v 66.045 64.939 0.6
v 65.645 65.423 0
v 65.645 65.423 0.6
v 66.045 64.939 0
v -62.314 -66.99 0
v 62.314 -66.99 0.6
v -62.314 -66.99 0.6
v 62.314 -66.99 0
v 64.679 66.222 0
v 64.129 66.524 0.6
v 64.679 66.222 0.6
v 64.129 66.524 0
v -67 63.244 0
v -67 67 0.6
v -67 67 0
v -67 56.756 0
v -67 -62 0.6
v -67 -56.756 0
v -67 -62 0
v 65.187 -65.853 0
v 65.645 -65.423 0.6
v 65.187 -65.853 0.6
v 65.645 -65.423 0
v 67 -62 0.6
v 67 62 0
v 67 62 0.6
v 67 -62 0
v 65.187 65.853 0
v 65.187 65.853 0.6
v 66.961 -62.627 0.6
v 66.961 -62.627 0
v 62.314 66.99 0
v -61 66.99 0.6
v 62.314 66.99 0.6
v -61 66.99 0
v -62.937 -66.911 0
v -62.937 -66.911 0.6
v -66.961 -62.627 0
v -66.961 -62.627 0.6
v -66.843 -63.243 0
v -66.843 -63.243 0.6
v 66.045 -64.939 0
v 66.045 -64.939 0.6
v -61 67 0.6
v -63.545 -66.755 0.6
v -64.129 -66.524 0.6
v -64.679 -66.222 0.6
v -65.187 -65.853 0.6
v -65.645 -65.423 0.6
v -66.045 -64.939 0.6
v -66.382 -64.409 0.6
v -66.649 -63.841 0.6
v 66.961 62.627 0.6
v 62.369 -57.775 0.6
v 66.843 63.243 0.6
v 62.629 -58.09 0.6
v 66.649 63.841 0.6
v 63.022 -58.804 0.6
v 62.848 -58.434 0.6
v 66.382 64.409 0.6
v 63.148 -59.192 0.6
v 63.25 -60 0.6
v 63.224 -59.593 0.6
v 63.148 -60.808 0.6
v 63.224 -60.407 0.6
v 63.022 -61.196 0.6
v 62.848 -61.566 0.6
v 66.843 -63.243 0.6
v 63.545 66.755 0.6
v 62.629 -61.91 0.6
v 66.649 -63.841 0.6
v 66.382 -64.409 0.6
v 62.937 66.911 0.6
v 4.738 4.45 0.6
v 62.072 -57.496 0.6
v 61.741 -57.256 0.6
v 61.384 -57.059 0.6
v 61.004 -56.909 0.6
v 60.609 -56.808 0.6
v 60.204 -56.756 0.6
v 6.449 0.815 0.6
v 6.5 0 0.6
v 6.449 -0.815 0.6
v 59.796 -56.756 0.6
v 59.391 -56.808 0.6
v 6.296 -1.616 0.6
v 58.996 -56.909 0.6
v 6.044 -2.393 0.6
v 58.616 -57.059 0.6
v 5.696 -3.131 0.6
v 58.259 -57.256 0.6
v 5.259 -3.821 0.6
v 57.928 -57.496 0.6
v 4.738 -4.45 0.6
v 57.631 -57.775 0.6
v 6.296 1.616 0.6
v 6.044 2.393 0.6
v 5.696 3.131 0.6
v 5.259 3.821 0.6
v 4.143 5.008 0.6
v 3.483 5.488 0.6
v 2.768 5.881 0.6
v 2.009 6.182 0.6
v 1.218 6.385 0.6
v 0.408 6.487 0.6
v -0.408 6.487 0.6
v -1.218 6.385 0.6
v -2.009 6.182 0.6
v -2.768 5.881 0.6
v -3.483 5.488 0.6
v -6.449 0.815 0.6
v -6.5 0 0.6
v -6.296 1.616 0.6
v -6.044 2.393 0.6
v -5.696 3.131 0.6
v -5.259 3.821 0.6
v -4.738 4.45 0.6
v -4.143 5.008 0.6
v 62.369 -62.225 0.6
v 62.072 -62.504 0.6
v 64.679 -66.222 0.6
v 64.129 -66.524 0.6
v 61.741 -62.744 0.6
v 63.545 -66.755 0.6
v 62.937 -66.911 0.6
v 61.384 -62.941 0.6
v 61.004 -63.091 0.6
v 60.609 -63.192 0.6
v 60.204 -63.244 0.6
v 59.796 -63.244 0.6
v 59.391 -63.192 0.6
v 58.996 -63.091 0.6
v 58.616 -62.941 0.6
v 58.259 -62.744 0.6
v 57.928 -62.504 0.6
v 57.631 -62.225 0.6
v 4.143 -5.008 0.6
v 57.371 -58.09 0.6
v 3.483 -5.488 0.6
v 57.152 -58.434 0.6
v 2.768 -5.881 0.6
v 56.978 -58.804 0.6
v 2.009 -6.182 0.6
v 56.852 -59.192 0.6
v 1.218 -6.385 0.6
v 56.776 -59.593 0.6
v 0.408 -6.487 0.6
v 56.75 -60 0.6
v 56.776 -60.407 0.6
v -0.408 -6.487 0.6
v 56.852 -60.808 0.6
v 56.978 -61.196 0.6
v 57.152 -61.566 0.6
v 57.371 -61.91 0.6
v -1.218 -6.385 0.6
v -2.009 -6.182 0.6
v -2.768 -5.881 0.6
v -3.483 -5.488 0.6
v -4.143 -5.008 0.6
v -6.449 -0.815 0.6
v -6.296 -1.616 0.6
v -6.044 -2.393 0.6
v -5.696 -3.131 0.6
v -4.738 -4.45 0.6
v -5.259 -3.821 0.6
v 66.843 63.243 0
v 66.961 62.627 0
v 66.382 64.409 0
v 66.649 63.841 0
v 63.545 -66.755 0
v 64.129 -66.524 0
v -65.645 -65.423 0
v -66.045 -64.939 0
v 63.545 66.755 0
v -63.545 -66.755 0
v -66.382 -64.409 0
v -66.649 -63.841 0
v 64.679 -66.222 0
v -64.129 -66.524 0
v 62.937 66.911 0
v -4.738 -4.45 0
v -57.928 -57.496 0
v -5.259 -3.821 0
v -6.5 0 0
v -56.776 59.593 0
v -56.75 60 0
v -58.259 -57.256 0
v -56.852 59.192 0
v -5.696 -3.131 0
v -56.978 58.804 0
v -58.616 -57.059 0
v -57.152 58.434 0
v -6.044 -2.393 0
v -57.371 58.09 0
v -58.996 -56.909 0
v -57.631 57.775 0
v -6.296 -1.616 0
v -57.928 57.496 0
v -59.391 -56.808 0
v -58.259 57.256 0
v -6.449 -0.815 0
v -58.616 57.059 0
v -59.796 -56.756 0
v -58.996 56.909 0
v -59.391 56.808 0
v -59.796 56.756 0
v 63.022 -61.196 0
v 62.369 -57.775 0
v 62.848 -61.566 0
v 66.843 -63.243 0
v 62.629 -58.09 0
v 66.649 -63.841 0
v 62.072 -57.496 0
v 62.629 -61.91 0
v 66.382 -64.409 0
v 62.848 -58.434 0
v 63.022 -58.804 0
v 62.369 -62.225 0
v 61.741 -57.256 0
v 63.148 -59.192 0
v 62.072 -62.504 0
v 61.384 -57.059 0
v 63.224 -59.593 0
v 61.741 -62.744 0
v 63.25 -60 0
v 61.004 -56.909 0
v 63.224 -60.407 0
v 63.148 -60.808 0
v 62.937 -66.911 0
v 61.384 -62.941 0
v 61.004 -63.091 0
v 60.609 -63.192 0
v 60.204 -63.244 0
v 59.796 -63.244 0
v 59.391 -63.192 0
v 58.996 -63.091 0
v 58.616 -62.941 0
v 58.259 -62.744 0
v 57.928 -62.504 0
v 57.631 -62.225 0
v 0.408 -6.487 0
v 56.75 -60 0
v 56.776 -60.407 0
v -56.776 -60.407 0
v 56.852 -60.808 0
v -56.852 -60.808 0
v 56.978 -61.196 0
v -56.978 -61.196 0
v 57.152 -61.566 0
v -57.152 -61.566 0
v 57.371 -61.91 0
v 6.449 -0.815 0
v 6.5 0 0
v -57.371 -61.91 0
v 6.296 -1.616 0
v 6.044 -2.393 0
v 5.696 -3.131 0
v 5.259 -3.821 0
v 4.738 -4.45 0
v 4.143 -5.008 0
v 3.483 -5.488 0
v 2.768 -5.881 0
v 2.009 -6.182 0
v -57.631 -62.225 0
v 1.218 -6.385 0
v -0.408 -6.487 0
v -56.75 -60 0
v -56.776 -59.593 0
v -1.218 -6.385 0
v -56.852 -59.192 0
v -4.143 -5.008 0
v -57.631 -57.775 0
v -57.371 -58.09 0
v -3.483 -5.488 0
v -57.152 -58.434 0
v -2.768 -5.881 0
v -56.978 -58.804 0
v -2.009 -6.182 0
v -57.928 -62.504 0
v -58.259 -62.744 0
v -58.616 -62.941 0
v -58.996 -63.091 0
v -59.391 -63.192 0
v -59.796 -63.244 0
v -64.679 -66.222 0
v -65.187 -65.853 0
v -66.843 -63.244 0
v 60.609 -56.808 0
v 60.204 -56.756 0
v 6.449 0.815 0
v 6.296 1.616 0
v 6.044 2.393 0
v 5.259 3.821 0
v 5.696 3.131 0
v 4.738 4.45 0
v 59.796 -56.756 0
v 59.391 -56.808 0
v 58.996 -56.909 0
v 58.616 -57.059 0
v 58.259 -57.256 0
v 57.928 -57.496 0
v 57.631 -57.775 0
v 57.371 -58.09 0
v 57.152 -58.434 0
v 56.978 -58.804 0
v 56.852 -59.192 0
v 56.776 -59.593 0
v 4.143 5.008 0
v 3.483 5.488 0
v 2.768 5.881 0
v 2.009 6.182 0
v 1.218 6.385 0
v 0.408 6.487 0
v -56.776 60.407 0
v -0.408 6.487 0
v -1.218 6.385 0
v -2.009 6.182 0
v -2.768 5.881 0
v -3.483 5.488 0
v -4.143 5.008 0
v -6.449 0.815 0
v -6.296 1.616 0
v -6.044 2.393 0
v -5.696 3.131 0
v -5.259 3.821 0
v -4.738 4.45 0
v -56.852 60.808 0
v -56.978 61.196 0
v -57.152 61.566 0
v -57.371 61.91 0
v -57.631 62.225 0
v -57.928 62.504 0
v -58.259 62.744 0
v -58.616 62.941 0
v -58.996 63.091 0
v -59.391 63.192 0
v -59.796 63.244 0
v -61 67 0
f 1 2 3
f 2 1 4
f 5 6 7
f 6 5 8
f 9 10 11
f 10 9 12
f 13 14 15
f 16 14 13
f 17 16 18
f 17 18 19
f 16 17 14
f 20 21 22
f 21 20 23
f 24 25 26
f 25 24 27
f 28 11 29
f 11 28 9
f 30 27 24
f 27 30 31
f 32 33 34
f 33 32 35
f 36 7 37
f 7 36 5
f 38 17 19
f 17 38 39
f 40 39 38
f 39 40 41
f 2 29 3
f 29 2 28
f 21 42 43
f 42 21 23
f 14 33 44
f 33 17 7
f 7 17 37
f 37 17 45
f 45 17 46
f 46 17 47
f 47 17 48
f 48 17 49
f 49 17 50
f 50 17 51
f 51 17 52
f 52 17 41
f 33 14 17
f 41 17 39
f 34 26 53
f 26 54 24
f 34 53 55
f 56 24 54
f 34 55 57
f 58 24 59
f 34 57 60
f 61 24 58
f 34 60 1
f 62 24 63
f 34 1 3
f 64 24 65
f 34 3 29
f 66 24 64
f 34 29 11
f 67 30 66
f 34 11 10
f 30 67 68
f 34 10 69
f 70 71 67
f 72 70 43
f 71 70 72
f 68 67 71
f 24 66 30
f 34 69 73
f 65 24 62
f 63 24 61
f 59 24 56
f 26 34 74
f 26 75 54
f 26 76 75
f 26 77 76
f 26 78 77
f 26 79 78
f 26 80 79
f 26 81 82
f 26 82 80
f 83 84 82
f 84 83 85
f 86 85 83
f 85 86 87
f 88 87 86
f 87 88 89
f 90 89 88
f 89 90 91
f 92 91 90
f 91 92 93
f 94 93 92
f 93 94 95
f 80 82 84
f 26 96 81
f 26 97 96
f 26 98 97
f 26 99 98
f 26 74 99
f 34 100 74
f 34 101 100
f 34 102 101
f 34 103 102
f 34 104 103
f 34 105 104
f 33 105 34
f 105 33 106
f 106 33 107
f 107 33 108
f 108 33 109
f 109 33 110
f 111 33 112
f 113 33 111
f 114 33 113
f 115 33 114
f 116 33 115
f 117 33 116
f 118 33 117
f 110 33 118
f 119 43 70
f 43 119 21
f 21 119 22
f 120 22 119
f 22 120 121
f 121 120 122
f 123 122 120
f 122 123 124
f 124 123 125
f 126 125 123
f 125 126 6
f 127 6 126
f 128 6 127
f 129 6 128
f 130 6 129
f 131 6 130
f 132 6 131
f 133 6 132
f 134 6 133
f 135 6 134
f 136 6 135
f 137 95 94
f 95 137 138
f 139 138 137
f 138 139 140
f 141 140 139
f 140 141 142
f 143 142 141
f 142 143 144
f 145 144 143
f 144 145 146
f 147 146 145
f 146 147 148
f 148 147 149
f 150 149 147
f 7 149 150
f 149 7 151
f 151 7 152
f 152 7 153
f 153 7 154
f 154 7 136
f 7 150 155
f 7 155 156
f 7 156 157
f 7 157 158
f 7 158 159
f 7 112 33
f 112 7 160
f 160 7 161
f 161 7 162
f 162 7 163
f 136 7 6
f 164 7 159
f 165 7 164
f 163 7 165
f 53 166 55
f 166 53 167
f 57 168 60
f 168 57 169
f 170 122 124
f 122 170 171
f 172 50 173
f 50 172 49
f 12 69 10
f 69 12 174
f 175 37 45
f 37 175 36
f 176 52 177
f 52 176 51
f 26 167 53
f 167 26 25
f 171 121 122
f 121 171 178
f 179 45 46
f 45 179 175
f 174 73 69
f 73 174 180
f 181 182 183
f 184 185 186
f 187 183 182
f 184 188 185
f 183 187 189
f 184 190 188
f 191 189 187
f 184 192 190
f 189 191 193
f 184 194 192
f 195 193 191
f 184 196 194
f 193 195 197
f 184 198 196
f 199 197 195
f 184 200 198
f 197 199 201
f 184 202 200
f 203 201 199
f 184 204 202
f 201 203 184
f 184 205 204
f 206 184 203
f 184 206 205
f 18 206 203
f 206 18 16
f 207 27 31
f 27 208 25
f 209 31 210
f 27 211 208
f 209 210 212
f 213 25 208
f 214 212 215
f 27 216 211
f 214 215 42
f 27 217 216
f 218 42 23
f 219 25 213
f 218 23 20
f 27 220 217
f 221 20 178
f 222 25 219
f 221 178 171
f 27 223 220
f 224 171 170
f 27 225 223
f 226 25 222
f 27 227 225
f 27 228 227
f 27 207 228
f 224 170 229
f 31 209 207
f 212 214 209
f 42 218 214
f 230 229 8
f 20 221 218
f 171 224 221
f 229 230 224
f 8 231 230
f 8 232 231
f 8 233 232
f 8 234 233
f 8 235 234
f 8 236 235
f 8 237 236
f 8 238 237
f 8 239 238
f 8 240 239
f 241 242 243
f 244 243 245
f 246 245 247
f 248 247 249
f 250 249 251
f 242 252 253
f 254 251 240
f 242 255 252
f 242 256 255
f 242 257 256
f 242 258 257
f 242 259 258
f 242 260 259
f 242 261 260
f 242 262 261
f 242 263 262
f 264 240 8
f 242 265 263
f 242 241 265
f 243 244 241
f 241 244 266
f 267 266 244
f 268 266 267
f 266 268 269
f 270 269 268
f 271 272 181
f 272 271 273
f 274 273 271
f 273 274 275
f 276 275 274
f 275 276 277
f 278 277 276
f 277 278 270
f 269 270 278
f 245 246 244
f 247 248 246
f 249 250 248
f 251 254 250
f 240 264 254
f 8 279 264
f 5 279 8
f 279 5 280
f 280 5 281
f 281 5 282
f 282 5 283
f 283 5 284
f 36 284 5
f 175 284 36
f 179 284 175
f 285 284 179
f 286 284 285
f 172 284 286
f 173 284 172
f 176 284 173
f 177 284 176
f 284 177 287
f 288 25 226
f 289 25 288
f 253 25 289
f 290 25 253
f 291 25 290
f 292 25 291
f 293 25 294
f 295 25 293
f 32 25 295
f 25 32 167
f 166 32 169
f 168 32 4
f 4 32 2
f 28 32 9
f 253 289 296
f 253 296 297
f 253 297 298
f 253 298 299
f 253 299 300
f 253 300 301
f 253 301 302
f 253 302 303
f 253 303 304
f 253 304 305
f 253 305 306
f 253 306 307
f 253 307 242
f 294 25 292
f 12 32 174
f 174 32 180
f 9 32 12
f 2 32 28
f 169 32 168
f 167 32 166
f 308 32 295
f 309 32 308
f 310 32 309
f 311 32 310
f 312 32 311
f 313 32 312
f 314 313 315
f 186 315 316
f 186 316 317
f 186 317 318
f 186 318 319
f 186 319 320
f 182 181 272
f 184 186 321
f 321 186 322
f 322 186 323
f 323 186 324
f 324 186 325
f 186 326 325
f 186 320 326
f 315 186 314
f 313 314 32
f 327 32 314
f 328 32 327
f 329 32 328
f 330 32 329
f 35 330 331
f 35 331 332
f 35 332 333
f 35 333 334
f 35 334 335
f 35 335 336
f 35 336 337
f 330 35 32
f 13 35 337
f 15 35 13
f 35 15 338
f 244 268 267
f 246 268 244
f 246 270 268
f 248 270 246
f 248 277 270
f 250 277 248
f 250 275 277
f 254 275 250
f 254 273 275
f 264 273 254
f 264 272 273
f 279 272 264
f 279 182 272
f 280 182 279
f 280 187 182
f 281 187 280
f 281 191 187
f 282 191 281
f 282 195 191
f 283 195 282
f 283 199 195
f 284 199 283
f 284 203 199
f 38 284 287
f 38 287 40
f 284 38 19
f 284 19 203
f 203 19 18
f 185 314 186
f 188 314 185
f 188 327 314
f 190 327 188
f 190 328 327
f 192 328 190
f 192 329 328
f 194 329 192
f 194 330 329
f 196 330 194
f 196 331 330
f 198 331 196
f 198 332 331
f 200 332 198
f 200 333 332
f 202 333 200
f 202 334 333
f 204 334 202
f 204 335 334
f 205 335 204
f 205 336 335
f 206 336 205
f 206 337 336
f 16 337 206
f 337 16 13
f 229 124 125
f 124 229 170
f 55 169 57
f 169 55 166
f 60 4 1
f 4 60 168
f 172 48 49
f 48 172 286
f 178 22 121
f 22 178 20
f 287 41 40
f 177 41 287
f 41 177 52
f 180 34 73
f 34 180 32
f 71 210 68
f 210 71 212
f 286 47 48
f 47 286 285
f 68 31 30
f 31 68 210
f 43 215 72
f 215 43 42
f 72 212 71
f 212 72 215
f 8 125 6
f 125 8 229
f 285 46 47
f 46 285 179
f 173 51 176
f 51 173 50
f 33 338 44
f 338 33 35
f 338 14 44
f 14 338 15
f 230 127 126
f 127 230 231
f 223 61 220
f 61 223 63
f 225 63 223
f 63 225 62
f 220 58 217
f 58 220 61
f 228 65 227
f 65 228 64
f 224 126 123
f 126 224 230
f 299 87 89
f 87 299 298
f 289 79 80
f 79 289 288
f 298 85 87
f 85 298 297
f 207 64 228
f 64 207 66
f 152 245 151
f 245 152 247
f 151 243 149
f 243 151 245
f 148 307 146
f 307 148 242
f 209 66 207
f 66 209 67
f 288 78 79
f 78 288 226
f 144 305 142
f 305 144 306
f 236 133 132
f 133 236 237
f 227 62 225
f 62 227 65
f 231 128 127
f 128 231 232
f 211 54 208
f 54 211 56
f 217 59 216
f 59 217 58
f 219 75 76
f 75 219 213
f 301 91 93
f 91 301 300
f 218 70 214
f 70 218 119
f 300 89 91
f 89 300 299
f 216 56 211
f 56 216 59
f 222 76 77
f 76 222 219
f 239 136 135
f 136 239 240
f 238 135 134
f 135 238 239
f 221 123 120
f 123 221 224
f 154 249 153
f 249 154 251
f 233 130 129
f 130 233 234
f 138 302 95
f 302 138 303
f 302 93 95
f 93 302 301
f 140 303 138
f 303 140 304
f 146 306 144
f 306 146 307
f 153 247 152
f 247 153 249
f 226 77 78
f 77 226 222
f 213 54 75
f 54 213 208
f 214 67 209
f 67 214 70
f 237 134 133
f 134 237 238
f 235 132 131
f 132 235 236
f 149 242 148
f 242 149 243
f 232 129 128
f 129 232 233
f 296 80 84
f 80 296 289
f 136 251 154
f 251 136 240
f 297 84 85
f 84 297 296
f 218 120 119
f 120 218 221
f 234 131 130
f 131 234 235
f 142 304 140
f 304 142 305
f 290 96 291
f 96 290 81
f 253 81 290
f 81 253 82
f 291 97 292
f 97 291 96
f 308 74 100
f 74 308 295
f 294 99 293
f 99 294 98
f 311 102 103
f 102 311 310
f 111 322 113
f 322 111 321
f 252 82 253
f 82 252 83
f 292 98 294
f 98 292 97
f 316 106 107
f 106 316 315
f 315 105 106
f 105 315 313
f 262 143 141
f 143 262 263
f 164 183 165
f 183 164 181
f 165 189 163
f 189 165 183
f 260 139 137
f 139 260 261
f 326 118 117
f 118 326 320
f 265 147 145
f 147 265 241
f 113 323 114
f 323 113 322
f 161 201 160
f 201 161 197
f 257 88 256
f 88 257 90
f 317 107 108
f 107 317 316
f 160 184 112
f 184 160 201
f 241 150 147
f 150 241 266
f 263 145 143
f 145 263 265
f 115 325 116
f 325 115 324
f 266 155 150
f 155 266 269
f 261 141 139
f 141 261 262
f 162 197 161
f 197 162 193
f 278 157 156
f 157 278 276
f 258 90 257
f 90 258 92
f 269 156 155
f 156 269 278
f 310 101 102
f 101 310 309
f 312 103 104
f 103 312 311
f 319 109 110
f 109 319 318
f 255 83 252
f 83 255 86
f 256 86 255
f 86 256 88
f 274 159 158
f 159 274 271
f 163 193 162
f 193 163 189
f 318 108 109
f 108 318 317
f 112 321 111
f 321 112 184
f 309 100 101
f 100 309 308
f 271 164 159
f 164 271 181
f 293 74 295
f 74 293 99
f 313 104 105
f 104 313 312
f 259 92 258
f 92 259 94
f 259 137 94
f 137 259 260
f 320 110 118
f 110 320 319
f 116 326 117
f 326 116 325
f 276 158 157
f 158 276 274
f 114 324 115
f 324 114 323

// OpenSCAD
$fn = 50;


difference() {
	union() {
		hull() {
			translate(v = [-62.0000000000, 62.0000000000, 0]) {
				cylinder(h = 0.6000000000, r = 5);
			}
			translate(v = [62.0000000000, 62.0000000000, 0]) {
				cylinder(h = 0.6000000000, r = 5);
			}
			translate(v = [-62.0000000000, -62.0000000000, 0]) {
				cylinder(h = 0.6000000000, r = 5);
			}
			translate(v = [62.0000000000, -62.0000000000, 0]) {
				cylinder(h = 0.6000000000, r = 5);
			}
		}
		translate(v = [-67.0000000000, 61.0000000000, 0]) {
			cube(size = [6, 6, 0.6000000000]);
		}
	}
	union() {
		translate(v = [-67.5000000000, -60.0000000000, -250.0000000000]) {
			rotate(a = [0, 0, 0]) {
				difference() {
					union() {
						hull() {
							translate(v = [7.5000000000, 0, 0]) {
								cylinder(h = 250, r = 3.2500000000, r1 = 3.2500000000, r2 = 3.2500000000);
							}
							translate(v = [-7.5000000000, 0, 0]) {
								cylinder(h = 250, r = 3.2500000000, r1 = 3.2500000000, r2 = 3.2500000000);
							}
						}
					}
					union();
				}
			}
		}
		translate(v = [-67.5000000000, 60.0000000000, -250.0000000000]) {
			rotate(a = [0, 0, 0]) {
				difference() {
					union() {
						hull() {
							translate(v = [7.5000000000, 0, 0]) {
								cylinder(h = 250, r = 3.2500000000, r1 = 3.2500000000, r2 = 3.2500000000);
							}
							translate(v = [-7.5000000000, 0, 0]) {
								cylinder(h = 250, r = 3.2500000000, r1 = 3.2500000000, r2 = 3.2500000000);
							}
						}
					}
					union();
				}
			}
		}
		translate(v = [60.0000000000, -60.0000000000, -50.0000000000]) {
			cylinder(h = 100, r = 3.2500000000);
		}
		cylinder(h = 0.6000000000, r = 6.5000000000);
	}
}
